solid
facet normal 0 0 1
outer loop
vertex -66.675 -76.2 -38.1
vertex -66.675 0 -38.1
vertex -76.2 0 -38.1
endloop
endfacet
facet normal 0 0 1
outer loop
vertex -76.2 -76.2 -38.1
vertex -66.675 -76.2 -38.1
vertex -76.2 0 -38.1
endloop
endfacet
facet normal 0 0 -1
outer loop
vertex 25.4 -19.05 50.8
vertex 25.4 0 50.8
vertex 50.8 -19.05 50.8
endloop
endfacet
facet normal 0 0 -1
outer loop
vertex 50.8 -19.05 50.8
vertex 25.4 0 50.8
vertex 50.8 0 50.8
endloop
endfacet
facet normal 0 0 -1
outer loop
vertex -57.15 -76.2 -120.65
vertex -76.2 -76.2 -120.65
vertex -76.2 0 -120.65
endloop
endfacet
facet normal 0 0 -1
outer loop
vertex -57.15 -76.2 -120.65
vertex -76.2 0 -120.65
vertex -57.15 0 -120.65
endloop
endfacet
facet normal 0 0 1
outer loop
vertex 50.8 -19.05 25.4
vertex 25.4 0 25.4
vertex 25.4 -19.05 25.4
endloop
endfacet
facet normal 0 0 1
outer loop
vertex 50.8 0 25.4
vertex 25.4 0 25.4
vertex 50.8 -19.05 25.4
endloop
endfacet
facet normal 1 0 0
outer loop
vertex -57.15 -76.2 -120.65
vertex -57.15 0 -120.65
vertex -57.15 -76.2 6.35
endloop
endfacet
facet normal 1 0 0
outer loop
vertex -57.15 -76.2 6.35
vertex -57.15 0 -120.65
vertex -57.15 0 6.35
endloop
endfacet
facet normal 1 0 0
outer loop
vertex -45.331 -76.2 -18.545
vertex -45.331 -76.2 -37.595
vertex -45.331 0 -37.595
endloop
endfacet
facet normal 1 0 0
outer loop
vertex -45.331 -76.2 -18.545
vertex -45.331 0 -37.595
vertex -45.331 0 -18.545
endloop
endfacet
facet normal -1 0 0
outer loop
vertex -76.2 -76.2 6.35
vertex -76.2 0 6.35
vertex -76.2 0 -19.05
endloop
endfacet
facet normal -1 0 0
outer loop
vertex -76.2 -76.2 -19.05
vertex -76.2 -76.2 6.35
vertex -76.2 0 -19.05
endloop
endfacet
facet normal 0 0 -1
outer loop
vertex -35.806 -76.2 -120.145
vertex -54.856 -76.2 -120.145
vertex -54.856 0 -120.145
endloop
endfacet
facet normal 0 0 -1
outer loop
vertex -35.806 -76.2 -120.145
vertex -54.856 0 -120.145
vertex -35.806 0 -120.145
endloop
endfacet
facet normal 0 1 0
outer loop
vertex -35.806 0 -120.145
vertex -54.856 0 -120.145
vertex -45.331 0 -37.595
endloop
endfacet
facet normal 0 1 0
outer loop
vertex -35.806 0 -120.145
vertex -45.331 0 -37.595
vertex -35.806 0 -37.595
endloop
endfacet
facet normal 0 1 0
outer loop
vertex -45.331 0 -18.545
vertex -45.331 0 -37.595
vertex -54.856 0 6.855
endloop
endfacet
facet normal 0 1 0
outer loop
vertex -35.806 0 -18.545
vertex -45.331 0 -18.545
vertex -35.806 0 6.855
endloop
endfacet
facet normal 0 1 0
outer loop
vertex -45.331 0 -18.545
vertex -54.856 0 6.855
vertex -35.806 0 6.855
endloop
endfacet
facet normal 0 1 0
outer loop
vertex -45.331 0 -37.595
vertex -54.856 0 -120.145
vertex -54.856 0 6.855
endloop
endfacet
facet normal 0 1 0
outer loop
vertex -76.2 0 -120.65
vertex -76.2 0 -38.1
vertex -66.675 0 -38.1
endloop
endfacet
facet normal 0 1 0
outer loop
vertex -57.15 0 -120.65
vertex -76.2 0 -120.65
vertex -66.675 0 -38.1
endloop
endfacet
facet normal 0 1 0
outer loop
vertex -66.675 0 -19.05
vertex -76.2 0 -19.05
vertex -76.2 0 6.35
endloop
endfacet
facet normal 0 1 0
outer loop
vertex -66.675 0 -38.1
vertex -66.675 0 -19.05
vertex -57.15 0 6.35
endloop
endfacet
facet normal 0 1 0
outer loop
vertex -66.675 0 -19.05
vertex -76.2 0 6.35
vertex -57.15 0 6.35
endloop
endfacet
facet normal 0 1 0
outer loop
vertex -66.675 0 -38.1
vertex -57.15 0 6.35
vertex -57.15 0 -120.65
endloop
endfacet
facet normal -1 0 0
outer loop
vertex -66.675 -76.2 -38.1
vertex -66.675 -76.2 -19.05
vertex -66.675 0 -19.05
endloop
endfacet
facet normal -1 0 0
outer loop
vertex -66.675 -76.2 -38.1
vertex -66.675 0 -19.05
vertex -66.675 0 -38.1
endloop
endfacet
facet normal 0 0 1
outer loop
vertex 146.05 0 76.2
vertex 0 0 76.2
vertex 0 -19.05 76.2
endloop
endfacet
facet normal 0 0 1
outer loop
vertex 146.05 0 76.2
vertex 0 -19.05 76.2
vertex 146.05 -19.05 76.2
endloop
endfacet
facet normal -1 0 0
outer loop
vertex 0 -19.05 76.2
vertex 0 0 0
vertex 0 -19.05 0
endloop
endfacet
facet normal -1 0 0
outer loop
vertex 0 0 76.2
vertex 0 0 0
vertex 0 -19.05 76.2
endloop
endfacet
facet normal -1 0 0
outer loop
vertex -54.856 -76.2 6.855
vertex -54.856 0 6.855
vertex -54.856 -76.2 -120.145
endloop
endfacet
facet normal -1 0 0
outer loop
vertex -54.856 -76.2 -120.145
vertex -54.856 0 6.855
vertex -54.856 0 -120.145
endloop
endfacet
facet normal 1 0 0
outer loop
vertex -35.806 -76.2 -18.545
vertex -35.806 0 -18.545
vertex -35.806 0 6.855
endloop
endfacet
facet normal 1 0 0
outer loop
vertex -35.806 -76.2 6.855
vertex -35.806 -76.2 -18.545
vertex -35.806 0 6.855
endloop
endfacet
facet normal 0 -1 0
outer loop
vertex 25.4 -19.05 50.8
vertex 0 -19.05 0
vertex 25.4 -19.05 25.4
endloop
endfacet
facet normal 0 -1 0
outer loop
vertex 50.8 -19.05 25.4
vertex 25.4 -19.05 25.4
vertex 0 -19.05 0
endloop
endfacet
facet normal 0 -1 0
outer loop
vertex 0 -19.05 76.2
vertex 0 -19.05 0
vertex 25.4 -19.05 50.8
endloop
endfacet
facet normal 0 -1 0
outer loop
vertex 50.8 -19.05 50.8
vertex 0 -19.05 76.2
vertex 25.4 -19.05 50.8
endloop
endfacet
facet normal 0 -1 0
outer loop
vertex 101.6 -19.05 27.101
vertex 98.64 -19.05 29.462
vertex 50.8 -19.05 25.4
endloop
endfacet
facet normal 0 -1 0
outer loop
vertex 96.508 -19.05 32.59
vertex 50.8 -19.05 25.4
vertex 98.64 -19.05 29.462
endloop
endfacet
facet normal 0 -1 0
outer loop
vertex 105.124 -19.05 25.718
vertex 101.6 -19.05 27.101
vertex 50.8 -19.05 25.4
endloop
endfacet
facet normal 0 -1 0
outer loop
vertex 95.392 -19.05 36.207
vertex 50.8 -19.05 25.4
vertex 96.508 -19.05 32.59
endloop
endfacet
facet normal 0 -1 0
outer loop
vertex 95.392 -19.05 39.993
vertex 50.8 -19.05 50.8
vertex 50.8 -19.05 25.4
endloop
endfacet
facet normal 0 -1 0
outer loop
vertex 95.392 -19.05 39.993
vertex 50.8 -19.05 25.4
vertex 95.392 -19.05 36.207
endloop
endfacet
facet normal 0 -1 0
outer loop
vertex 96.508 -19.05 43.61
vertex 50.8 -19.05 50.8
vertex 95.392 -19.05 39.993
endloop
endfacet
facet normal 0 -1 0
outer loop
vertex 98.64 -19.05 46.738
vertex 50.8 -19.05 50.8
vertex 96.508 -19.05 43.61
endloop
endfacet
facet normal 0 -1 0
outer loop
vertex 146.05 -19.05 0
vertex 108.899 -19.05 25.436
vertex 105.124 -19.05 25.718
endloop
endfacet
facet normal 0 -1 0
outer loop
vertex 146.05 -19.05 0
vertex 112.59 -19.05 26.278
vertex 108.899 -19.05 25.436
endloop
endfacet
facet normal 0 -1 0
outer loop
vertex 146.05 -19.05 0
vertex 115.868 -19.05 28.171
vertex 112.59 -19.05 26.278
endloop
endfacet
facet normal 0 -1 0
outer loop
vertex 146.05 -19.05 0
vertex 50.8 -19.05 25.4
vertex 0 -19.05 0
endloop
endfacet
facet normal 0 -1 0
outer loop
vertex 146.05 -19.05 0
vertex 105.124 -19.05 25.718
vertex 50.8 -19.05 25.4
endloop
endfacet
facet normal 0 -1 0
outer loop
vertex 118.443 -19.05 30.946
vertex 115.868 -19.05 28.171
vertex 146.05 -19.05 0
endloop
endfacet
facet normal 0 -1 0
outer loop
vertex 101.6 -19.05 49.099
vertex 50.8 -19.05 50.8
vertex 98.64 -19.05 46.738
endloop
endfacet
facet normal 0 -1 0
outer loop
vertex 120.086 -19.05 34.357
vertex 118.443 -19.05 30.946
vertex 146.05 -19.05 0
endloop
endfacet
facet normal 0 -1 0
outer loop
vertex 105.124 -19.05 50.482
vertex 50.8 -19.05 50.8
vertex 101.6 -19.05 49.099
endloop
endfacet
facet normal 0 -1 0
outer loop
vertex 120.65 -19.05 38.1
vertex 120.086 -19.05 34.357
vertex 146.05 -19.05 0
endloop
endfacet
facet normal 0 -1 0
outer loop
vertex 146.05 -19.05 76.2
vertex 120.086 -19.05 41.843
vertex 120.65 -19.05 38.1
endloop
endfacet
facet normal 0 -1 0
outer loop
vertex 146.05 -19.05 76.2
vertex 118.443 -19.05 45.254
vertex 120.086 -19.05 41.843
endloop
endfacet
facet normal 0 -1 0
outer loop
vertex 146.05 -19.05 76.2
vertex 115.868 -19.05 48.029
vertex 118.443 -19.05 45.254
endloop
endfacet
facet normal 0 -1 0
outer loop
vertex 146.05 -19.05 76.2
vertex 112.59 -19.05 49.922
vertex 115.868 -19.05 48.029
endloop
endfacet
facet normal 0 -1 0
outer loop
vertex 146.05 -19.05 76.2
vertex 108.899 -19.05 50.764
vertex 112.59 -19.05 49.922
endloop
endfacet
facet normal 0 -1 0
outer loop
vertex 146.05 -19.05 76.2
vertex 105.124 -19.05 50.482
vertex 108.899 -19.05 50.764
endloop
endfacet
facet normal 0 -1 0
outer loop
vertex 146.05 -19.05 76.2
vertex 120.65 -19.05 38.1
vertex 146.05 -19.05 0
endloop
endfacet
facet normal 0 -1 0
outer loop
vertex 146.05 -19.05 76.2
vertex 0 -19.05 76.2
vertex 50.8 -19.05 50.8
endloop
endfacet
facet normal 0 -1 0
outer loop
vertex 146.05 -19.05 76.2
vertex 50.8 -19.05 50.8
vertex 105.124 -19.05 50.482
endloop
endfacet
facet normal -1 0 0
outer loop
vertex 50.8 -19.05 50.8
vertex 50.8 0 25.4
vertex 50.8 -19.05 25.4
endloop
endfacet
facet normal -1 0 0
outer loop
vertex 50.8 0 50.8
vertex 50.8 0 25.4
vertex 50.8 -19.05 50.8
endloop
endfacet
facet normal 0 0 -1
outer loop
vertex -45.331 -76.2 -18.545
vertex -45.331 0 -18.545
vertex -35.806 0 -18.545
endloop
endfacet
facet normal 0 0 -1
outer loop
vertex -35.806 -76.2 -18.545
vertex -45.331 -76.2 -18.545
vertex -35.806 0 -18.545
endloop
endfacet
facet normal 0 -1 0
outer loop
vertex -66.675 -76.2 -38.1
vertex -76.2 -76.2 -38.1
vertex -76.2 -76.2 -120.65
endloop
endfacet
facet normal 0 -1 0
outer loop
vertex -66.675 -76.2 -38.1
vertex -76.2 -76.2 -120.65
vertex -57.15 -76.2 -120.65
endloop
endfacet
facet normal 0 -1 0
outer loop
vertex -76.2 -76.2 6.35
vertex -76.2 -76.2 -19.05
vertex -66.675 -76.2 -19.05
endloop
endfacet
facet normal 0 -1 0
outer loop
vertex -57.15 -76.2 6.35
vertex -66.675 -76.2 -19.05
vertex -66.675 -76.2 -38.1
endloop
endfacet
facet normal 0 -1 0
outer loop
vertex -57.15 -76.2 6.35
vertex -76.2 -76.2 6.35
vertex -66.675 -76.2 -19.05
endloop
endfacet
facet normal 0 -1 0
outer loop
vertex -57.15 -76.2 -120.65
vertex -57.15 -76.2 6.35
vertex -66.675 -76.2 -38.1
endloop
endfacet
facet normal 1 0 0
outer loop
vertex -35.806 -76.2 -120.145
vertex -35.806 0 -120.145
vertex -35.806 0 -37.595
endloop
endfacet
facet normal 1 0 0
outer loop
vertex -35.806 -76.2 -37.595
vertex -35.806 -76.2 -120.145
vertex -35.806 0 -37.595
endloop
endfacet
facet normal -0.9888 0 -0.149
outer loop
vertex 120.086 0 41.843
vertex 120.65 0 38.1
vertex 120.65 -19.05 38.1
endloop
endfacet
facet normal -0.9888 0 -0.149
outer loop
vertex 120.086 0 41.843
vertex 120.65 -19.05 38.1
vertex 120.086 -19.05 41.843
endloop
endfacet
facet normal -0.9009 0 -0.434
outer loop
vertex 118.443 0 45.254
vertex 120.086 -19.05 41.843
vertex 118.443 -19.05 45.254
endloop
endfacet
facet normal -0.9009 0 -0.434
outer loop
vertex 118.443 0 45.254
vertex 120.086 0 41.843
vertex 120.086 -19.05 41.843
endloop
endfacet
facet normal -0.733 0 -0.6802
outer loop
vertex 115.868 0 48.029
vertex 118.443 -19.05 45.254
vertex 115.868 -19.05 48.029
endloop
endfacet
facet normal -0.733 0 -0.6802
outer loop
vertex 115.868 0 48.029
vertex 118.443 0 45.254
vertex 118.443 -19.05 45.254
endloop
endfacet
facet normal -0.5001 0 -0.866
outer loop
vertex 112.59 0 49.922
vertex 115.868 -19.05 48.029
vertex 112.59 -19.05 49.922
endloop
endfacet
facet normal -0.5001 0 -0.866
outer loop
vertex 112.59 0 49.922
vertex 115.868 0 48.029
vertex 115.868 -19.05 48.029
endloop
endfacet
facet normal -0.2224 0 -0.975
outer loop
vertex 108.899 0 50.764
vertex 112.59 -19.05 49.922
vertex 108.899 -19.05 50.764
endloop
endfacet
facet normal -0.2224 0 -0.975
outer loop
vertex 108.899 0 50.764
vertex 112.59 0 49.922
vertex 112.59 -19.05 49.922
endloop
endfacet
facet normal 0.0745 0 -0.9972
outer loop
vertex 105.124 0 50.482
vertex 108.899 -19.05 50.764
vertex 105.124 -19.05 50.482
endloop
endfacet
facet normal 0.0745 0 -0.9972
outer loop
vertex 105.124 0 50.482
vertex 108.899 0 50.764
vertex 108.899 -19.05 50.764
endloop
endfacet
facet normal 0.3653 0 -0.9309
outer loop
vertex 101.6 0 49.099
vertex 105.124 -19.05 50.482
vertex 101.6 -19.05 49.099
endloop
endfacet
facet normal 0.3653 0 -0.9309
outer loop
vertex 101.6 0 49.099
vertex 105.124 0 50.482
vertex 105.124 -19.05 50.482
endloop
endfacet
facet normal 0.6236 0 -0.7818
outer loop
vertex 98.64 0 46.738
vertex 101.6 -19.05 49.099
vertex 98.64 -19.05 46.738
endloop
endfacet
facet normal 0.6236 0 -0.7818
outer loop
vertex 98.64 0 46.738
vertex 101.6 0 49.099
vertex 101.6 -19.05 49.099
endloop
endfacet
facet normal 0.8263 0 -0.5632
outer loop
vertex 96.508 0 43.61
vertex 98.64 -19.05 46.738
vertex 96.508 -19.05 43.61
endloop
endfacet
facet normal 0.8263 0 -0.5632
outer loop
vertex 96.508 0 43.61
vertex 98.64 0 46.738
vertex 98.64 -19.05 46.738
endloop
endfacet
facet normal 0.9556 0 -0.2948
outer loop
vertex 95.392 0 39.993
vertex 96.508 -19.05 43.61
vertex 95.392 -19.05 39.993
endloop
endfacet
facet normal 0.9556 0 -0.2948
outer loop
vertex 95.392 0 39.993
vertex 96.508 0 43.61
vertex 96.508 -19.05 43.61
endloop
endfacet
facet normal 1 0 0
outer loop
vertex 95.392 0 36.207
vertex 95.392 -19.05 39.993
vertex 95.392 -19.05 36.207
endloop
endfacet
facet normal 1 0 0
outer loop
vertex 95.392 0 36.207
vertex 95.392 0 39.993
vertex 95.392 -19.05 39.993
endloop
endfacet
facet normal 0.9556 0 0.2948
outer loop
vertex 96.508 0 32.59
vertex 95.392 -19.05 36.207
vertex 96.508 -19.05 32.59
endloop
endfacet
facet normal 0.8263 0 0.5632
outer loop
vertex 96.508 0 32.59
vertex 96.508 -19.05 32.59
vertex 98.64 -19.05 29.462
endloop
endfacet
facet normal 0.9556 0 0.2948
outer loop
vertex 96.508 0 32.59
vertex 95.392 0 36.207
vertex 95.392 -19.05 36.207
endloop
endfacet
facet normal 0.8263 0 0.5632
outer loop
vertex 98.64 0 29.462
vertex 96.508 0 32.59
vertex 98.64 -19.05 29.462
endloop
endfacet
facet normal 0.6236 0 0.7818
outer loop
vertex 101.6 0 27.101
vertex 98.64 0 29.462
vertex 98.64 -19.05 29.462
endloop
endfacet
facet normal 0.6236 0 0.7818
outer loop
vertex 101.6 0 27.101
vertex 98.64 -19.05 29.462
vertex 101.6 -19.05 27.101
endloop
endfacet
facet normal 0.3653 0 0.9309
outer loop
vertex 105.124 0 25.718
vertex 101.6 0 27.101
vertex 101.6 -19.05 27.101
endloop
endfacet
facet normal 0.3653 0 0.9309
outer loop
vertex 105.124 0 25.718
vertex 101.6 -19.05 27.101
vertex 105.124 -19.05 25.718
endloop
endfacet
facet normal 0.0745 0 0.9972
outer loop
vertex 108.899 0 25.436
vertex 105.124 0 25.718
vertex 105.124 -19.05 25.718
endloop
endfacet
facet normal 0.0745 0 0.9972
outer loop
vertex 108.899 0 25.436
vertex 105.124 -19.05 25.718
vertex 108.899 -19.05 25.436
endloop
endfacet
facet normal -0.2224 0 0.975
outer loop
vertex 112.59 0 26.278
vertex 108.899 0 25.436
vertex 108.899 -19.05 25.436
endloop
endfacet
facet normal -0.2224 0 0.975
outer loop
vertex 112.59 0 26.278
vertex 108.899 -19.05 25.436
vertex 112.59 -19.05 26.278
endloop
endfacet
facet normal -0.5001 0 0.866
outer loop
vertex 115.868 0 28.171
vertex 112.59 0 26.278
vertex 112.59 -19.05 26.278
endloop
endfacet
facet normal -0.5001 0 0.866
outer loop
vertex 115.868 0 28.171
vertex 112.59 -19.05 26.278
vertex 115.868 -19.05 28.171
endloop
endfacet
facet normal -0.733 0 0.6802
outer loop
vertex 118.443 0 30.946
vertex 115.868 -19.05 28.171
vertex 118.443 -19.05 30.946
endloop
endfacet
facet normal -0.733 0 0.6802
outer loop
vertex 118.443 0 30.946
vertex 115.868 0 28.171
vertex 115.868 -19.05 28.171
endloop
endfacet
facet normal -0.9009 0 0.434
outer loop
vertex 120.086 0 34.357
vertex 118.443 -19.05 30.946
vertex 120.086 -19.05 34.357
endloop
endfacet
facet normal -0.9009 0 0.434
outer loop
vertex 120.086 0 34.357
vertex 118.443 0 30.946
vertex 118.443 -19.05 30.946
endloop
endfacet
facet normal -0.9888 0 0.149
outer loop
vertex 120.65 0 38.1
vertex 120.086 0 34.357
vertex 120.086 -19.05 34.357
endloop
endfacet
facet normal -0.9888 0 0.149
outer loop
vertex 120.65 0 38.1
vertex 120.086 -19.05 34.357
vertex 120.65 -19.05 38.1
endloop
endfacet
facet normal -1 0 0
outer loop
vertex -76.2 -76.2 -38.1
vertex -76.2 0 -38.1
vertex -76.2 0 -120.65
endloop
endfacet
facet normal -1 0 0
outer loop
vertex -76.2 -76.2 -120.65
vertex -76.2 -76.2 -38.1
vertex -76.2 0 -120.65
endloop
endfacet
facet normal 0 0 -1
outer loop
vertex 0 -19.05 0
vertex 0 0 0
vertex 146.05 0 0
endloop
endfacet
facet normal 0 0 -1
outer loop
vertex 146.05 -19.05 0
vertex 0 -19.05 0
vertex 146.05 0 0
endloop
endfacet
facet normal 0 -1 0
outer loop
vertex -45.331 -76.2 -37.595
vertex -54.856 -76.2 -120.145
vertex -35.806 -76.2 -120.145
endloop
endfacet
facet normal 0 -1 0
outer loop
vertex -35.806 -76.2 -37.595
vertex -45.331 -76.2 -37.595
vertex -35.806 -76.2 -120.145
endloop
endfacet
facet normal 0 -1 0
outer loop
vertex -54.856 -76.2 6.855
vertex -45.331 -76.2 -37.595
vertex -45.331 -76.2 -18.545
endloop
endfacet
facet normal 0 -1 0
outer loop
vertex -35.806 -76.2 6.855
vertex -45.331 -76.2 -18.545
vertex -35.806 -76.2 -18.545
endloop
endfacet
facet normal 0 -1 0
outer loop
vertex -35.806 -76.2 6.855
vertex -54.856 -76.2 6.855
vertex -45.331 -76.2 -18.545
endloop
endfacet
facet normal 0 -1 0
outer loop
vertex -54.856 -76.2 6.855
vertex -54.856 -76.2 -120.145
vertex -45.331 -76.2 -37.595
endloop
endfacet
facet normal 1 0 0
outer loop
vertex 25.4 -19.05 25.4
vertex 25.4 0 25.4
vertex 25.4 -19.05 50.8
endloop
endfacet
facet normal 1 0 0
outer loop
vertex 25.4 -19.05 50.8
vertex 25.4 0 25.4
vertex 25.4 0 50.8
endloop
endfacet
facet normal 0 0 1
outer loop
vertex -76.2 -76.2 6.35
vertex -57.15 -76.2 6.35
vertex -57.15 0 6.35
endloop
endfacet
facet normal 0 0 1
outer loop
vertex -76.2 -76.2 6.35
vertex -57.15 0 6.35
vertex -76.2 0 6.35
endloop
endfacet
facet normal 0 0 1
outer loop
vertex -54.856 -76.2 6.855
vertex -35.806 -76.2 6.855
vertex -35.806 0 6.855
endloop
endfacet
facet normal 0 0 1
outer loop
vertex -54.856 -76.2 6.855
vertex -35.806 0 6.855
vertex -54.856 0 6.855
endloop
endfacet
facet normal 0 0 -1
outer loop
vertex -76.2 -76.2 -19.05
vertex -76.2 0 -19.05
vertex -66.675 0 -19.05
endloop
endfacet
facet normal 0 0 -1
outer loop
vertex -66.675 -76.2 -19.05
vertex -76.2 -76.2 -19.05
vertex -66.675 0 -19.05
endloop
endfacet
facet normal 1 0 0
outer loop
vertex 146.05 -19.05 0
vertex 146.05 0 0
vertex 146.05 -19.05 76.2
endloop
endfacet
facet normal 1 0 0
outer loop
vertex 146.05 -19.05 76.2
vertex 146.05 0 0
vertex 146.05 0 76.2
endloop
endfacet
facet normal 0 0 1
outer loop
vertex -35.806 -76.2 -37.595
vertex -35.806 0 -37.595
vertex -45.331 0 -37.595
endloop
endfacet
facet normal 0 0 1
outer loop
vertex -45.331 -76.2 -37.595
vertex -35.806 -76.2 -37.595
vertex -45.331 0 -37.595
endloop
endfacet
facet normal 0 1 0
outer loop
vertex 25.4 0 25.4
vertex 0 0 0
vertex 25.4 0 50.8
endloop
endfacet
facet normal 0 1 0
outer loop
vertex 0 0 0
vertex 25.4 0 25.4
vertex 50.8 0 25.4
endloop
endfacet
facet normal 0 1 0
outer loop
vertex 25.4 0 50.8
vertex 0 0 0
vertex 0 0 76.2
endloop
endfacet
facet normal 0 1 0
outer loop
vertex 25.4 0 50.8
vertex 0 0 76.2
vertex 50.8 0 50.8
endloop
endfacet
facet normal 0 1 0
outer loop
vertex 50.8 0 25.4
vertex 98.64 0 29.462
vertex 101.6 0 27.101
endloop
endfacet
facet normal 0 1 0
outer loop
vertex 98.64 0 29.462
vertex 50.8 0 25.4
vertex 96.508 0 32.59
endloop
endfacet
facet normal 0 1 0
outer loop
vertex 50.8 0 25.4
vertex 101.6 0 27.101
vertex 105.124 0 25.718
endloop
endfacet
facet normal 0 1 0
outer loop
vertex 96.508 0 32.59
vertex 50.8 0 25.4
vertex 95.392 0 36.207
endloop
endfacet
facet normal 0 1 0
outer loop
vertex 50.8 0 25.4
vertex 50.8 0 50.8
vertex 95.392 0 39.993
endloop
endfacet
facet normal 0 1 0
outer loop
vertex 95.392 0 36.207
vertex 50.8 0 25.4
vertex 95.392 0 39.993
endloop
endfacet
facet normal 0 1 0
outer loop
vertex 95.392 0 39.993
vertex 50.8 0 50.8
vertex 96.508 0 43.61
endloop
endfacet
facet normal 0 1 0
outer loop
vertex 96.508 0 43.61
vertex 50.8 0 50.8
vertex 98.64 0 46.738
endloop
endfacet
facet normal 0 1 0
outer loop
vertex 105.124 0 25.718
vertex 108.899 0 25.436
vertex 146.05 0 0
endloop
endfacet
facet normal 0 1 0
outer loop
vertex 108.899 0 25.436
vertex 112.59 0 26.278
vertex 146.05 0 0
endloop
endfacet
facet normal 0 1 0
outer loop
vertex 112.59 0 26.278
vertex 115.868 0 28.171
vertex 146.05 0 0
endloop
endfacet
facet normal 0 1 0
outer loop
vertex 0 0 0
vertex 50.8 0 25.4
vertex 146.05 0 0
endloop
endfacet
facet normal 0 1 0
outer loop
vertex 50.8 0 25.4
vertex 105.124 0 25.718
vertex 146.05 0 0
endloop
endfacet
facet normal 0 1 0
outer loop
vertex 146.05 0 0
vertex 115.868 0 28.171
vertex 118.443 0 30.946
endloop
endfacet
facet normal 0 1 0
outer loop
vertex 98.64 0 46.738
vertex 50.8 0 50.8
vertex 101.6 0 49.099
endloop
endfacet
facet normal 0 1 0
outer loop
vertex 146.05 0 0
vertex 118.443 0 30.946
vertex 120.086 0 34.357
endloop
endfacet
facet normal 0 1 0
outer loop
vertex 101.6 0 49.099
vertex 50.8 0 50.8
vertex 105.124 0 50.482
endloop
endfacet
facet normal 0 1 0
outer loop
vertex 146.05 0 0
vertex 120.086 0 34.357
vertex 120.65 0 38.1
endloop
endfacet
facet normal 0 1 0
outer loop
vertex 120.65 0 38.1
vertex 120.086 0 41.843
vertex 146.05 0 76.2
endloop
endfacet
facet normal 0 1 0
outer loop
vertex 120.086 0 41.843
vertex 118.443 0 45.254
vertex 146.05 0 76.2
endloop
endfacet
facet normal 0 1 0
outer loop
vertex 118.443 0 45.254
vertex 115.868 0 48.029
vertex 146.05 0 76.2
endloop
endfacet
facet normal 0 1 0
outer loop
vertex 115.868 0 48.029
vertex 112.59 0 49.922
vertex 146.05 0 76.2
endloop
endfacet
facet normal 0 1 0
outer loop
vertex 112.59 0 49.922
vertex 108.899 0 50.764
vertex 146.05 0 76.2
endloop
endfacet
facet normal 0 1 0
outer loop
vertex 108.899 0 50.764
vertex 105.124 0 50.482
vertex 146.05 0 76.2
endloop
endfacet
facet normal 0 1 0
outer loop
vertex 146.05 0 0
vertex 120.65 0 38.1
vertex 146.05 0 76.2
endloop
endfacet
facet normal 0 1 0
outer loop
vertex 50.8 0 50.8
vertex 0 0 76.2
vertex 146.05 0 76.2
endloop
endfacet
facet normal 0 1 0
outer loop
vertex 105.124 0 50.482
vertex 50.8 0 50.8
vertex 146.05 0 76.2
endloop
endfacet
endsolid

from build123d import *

# Parameters (mm, degrees)
F0_W     = 146.05
F0_H     = 76.2
F0_W_2   = 25.4
F0_H_2   = 25.4
F0_R     = 12.7
F1_DEPTH = 19.05
F3_DEPTH = 76.2
F5_DEPTH = 76.2


with BuildPart() as f1:
    # F0 (on Front) → F1 (new body)
    with BuildSketch(Plane.XZ):
        with Locations((73.025, 38.1)):
            Rectangle(F0_W, F0_H)
        with Locations((38.1, 38.1)):
            Rectangle(F0_W_2, F0_H_2, mode=Mode.SUBTRACT)
        with Locations((107.95, 38.1)):
            Circle(F0_R, mode=Mode.SUBTRACT)
    extrude(amount=F1_DEPTH)


with BuildPart() as f3:
    # F2 (on Front) → F3 (new body)
    with BuildSketch(Plane.XZ):
        Polygon((-76.2, 6.35), (-76.2, -19.05), (-66.675, -19.05), (-66.675, -38.1), (-76.2, -38.1), (-76.2, -120.65), (-57.15, -120.65), (-57.15, 6.35), align=None)
    extrude(amount=F3_DEPTH)


with BuildPart() as f5:
    # F4 (on Front) → F5 (new body)
    with BuildSketch(Plane.XZ):
        Polygon((-35.805511, 6.855044), (-54.855511, 6.855044), (-54.855511, -120.144956), (-35.805511, -120.144956), (-35.805511, -37.594956), (-45.330511, -37.594956), (-45.330511, -18.544956), (-35.805511, -18.544956), align=None)
    extrude(amount=F5_DEPTH)


solid = Compound([f1.part, f3.part, f5.part])
